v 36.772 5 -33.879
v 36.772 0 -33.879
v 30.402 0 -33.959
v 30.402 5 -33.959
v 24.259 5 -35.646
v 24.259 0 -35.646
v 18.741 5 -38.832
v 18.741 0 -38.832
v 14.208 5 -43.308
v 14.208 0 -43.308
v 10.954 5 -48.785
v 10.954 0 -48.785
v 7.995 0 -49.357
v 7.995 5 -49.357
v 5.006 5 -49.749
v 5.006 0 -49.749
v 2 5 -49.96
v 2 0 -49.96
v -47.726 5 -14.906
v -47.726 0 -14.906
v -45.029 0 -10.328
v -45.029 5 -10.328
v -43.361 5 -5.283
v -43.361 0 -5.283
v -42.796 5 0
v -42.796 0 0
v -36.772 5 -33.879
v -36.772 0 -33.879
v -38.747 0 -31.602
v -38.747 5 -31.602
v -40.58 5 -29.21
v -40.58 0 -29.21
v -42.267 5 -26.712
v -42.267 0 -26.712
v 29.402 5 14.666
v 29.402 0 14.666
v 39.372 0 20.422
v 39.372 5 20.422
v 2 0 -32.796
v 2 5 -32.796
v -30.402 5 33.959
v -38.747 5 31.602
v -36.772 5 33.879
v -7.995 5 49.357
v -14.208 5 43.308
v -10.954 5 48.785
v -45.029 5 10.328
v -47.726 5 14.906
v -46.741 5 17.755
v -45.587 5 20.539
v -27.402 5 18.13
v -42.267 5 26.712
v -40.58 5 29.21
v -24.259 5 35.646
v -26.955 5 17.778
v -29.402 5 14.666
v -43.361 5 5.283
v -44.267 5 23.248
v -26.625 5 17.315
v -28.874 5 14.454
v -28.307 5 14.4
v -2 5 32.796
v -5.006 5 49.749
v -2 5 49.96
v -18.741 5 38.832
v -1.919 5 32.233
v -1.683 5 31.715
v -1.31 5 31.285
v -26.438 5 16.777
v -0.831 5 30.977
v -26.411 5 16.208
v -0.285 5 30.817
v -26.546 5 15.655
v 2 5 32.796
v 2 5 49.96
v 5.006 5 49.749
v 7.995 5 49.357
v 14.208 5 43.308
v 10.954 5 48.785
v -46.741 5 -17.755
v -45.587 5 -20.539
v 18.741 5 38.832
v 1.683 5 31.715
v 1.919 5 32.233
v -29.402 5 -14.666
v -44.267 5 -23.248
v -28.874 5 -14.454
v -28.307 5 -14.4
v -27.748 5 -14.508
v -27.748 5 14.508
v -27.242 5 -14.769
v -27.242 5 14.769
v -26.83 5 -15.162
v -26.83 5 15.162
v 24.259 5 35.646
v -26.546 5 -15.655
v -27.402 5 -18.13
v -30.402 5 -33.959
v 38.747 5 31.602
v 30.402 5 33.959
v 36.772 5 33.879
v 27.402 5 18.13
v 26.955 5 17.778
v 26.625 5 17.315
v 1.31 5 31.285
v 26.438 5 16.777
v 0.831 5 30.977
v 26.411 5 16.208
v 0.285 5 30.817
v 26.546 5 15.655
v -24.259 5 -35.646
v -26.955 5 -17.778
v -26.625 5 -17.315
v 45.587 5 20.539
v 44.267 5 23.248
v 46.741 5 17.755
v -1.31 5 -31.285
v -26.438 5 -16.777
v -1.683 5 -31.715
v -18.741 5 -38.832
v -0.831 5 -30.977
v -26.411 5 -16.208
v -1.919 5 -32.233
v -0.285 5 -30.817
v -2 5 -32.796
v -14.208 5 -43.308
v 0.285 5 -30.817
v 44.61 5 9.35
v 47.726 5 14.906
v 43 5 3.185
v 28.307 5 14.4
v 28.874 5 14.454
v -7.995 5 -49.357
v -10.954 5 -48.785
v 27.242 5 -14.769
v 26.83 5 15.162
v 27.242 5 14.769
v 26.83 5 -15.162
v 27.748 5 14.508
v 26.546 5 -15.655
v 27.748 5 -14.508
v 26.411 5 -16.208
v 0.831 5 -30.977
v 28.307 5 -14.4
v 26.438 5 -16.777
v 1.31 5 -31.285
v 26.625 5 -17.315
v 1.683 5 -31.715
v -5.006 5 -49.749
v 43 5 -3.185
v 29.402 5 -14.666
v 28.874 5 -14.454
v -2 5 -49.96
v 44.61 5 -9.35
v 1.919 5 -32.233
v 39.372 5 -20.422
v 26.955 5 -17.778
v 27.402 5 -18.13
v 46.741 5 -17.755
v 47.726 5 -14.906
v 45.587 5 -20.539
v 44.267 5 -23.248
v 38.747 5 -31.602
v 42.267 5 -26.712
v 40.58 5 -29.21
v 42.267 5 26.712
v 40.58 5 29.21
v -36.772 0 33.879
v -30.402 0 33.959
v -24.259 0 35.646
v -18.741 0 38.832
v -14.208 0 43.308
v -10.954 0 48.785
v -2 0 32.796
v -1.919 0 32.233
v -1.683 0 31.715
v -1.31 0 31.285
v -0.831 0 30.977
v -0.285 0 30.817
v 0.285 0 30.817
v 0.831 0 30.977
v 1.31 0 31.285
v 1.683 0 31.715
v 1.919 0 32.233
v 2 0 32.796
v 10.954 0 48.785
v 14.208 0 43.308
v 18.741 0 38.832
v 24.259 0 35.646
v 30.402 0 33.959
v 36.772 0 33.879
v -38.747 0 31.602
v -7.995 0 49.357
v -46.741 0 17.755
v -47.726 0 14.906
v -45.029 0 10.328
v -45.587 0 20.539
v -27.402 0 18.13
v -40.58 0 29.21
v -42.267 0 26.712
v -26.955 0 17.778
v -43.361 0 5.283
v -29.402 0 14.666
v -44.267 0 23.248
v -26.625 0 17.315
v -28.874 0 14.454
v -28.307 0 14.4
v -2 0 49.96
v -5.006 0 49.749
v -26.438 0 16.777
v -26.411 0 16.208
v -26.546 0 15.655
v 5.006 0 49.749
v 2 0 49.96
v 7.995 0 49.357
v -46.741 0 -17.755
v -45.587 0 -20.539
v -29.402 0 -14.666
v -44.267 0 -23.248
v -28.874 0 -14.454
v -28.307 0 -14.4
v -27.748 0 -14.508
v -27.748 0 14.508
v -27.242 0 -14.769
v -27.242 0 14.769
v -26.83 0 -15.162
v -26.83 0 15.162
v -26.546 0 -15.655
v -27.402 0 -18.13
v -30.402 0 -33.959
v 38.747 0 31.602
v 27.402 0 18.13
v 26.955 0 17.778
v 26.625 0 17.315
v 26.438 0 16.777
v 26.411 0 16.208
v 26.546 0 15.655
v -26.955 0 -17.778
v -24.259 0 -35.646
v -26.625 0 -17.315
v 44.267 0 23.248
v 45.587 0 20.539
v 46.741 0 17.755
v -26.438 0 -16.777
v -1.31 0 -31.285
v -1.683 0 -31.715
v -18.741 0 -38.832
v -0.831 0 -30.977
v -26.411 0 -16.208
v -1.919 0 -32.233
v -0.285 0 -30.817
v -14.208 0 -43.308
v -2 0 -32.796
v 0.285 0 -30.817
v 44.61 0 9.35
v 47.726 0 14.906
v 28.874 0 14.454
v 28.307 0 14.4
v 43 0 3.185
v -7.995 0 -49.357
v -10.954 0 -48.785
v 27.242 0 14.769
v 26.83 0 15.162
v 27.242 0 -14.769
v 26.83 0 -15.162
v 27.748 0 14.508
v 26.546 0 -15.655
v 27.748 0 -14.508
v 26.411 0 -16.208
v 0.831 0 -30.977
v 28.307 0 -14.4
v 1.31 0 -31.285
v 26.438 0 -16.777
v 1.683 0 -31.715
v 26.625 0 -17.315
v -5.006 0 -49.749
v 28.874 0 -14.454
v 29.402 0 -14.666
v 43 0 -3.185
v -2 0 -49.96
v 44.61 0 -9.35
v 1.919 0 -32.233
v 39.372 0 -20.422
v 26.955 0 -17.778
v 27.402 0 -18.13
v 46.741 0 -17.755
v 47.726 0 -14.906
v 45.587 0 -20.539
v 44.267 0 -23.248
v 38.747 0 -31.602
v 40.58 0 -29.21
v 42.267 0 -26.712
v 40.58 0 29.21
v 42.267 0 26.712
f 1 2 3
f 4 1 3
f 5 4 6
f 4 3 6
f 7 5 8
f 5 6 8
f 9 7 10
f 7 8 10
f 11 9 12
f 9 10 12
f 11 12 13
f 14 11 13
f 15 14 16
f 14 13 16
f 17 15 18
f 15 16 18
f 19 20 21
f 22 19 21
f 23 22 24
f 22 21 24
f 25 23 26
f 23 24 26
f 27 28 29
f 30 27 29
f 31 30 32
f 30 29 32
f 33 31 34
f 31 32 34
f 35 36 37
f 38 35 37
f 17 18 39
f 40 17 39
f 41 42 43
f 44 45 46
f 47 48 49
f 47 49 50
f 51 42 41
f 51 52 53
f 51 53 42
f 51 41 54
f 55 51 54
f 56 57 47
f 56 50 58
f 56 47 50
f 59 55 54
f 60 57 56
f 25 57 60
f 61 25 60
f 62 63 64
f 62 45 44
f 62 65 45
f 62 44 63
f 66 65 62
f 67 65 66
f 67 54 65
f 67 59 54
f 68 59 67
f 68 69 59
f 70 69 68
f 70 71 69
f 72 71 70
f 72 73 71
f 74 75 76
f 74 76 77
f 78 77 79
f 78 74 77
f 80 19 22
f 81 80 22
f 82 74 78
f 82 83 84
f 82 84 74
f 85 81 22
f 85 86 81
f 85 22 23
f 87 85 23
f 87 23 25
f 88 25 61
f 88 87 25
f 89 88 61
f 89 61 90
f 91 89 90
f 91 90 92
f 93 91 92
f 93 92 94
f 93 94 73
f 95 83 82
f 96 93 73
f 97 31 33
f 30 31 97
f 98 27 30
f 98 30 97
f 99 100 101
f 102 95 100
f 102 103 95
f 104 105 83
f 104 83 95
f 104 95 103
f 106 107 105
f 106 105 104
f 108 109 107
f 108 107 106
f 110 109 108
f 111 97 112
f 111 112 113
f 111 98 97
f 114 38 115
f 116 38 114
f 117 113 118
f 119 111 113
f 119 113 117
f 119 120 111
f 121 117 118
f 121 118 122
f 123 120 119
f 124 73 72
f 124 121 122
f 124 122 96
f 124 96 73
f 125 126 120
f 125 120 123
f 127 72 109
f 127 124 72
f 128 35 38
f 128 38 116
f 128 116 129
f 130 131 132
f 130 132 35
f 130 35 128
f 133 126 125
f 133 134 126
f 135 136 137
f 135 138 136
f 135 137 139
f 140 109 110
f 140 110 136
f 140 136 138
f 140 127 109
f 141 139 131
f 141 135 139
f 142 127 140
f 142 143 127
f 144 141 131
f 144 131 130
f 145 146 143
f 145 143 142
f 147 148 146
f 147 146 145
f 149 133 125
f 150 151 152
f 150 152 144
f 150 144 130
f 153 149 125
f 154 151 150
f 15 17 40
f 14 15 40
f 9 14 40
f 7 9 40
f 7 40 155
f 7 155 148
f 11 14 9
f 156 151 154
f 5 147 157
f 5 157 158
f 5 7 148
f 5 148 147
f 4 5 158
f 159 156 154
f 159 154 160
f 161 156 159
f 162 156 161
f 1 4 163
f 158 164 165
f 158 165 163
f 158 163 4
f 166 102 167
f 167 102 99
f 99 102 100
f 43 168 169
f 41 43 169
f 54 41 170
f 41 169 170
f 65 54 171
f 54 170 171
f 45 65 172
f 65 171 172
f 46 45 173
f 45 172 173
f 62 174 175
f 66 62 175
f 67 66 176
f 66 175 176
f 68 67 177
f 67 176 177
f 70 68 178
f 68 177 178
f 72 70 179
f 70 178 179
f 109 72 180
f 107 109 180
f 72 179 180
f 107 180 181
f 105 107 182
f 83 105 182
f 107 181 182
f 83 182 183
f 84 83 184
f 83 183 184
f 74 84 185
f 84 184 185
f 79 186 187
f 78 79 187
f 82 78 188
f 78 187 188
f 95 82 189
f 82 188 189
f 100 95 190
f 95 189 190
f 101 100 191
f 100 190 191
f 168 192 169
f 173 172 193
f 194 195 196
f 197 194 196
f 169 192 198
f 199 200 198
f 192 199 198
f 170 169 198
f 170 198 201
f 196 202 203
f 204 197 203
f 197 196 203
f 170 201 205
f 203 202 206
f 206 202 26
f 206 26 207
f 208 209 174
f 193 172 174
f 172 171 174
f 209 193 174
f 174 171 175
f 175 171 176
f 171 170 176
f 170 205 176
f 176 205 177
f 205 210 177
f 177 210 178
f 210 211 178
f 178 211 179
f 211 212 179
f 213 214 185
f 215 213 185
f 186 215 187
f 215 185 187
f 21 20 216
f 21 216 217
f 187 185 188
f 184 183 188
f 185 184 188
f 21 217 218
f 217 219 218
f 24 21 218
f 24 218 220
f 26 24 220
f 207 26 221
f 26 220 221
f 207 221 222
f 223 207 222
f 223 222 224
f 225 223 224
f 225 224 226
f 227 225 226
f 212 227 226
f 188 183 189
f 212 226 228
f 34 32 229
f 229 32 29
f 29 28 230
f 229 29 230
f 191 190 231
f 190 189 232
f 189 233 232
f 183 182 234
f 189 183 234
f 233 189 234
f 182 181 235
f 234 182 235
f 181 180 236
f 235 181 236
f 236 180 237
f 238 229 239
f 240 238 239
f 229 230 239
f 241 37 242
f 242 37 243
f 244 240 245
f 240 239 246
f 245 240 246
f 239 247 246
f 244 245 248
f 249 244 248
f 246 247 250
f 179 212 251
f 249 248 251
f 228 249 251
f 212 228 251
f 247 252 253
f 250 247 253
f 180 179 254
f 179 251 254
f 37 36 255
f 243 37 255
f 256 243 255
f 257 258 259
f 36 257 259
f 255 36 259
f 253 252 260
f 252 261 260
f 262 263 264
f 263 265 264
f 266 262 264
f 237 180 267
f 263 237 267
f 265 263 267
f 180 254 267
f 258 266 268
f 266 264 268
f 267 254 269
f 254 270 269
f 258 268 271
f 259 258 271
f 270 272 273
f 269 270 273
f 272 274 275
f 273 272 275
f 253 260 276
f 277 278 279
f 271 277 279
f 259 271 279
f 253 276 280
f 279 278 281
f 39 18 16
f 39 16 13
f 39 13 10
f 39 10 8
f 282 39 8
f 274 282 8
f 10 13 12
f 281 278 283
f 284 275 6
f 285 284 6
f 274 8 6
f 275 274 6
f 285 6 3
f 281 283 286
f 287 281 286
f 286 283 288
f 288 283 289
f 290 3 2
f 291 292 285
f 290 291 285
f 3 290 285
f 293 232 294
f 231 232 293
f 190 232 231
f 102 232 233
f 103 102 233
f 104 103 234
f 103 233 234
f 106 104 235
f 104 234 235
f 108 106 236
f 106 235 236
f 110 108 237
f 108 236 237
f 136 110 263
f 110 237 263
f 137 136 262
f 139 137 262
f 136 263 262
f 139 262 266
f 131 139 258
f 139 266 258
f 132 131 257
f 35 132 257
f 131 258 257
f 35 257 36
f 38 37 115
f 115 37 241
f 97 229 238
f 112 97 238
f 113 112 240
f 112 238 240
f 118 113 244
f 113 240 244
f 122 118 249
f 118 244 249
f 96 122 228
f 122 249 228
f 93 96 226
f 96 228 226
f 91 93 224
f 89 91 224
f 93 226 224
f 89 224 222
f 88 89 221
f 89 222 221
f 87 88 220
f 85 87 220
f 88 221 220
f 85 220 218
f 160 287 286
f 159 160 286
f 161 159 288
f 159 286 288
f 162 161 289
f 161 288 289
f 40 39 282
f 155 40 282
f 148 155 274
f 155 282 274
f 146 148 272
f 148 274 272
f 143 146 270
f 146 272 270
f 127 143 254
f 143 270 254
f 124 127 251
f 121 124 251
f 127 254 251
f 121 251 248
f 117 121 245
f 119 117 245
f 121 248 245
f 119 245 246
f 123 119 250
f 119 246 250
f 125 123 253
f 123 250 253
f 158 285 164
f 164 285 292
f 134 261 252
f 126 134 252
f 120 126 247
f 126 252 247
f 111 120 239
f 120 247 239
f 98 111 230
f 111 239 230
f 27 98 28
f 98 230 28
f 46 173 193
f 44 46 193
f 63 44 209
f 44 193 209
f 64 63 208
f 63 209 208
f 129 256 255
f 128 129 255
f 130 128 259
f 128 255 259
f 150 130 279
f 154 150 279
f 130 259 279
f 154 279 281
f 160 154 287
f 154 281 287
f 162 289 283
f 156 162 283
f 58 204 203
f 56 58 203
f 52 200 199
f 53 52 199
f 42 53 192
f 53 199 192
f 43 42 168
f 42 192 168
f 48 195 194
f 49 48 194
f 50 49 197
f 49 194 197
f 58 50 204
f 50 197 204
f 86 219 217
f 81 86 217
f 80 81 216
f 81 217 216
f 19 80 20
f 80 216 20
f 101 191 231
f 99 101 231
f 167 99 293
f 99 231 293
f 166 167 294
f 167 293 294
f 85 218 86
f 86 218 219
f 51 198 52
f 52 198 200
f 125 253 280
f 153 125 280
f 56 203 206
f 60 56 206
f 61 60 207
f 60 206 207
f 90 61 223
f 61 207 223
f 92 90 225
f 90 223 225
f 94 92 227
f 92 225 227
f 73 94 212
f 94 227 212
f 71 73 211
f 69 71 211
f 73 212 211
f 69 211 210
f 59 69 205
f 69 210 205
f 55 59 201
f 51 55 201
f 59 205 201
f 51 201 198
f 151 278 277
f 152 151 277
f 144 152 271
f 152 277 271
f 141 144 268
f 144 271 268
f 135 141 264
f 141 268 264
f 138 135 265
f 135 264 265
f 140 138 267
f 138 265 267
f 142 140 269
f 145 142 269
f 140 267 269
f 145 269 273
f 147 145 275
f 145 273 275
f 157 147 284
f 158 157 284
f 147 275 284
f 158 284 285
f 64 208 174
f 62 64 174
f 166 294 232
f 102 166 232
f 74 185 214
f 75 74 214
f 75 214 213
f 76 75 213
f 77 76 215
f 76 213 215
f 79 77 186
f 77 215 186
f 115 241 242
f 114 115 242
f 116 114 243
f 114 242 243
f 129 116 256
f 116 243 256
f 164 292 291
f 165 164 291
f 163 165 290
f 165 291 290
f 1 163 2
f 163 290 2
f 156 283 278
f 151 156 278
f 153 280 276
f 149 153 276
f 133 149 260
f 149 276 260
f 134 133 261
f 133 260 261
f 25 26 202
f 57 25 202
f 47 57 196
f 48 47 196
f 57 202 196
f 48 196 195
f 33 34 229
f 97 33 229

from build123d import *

# Parameters (mm, degrees)
BOSS_EXTRUDE1_DEPTH = 5


with BuildPart() as part:
    # Sketch1 → Boss-Extrude1 (new body)
    with BuildSketch(Plane(origin=(0, 0, 0), x_dir=(1, 0, 0), z_dir=(0, 1, 0))):
        with BuildLine():
            ThreePointArc((47.726299074, 14.90638711), (46.185164881, 19.155431211), (44.266615306, 23.247941186))
            Line((44.266615306, 23.247941186), (39.371782551, 20.421908177))
            ThreePointArc((39.371782551, 20.421908177), (32.796167617, 0), (39.371782551, -20.421908177))
            Line((39.371782551, -20.421908177), (44.266615306, -23.247941186))
            ThreePointArc((44.266615306, -23.247941186), (46.185164881, -19.155431211), (47.726299074, -14.90638711))
            ThreePointArc((47.726299074, -14.90638711), (42.796167617, 0), (47.726299074, 14.90638711))
        make_face()
        with BuildLine():
            ThreePointArc((39.371782551, -20.421908177), (32.796167617, 0), (39.371782551, 20.421908177))
            Line((39.371782551, 20.421908177), (29.402314303, 14.666033001))
            ThreePointArc((29.402314303, 14.666033001), (26.670263496, 15.398083809), (27.402314303, 18.130134616))
            Line((27.402314303, 18.130134616), (42.266615306, 26.712042801))
            ThreePointArc((42.266615306, 26.712042801), (39.68167249, 30.41981046), (36.772459453, 33.878993872))
            ThreePointArc((36.772459453, 33.878993872), (21.398083809, 37.062568341), (10.953839621, 48.785380982))
            ThreePointArc((10.953839621, 48.785380982), (6.503492392, 49.575241671), (2, 49.959983987))
            Line((2, 49.959983987), (2, 32.796167617))
            ThreePointArc((2, 32.796167617), (0, 30.796167617), (-2, 32.796167617))
            Line((-2, 32.796167617), (-2, 49.959983987))
            ThreePointArc((-2, 49.959983987), (-6.503492392, 49.575241671), (-10.953839621, 48.785380982))
            ThreePointArc((-10.953839621, 48.785380982), (-21.398083809, 37.062568341), (-36.772459453, 33.878993872))
            ThreePointArc((-36.772459453, 33.878993872), (-39.68167249, 30.41981046), (-42.266615306, 26.712042801))
            Line((-42.266615306, 26.712042801), (-27.402314303, 18.130134616))
            ThreePointArc((-27.402314303, 18.130134616), (-26.670263496, 15.398083809), (-29.402314303, 14.666033001))
            Line((-29.402314303, 14.666033001), (-44.266615306, 23.247941186))
            ThreePointArc((-44.266615306, 23.247941186), (-46.185164881, 19.155431211), (-47.726299074, 14.90638711))
            ThreePointArc((-47.726299074, 14.90638711), (-44.060680329, 7.850263895), (-42.796167617, 0))
            ThreePointArc((-42.796167617, 0), (-44.060680329, -7.850263895), (-47.726299074, -14.90638711))
            ThreePointArc((-47.726299074, -14.90638711), (-46.185164881, -19.155431211), (-44.266615306, -23.247941186))
            Line((-44.266615306, -23.247941186), (-29.402314303, -14.666033001))
            ThreePointArc((-29.402314303, -14.666033001), (-26.670263496, -15.398083809), (-27.402314303, -18.130134616))
            Line((-27.402314303, -18.130134616), (-42.266615306, -26.712042801))
            ThreePointArc((-42.266615306, -26.712042801), (-39.68167249, -30.41981046), (-36.772459453, -33.878993872))
            ThreePointArc((-36.772459453, -33.878993872), (-21.398083809, -37.062568341), (-10.953839621, -48.785380982))
            ThreePointArc((-10.953839621, -48.785380982), (-6.503492392, -49.575241671), (-2, -49.959983987))
            Line((-2, -49.959983987), (-2, -32.796167617))
            ThreePointArc((-2, -32.796167617), (0, -30.796167617), (2, -32.796167617))
            Line((2, -32.796167617), (2, -49.959983987))
            ThreePointArc((2, -49.959983987), (6.503492392, -49.575241671), (10.953839621, -48.785380982))
            ThreePointArc((10.953839621, -48.785380982), (21.398083809, -37.062568341), (36.772459453, -33.878993872))
            ThreePointArc((36.772459453, -33.878993872), (39.68167249, -30.41981046), (42.266615306, -26.712042801))
            Line((42.266615306, -26.712042801), (27.402314303, -18.130134616))
            ThreePointArc((27.402314303, -18.130134616), (26.670263496, -15.398083809), (29.402314303, -14.666033001))
            Line((29.402314303, -14.666033001), (39.371782551, -20.421908177))
        make_face()
    extrude(amount=BOSS_EXTRUDE1_DEPTH)


solid = part.part
